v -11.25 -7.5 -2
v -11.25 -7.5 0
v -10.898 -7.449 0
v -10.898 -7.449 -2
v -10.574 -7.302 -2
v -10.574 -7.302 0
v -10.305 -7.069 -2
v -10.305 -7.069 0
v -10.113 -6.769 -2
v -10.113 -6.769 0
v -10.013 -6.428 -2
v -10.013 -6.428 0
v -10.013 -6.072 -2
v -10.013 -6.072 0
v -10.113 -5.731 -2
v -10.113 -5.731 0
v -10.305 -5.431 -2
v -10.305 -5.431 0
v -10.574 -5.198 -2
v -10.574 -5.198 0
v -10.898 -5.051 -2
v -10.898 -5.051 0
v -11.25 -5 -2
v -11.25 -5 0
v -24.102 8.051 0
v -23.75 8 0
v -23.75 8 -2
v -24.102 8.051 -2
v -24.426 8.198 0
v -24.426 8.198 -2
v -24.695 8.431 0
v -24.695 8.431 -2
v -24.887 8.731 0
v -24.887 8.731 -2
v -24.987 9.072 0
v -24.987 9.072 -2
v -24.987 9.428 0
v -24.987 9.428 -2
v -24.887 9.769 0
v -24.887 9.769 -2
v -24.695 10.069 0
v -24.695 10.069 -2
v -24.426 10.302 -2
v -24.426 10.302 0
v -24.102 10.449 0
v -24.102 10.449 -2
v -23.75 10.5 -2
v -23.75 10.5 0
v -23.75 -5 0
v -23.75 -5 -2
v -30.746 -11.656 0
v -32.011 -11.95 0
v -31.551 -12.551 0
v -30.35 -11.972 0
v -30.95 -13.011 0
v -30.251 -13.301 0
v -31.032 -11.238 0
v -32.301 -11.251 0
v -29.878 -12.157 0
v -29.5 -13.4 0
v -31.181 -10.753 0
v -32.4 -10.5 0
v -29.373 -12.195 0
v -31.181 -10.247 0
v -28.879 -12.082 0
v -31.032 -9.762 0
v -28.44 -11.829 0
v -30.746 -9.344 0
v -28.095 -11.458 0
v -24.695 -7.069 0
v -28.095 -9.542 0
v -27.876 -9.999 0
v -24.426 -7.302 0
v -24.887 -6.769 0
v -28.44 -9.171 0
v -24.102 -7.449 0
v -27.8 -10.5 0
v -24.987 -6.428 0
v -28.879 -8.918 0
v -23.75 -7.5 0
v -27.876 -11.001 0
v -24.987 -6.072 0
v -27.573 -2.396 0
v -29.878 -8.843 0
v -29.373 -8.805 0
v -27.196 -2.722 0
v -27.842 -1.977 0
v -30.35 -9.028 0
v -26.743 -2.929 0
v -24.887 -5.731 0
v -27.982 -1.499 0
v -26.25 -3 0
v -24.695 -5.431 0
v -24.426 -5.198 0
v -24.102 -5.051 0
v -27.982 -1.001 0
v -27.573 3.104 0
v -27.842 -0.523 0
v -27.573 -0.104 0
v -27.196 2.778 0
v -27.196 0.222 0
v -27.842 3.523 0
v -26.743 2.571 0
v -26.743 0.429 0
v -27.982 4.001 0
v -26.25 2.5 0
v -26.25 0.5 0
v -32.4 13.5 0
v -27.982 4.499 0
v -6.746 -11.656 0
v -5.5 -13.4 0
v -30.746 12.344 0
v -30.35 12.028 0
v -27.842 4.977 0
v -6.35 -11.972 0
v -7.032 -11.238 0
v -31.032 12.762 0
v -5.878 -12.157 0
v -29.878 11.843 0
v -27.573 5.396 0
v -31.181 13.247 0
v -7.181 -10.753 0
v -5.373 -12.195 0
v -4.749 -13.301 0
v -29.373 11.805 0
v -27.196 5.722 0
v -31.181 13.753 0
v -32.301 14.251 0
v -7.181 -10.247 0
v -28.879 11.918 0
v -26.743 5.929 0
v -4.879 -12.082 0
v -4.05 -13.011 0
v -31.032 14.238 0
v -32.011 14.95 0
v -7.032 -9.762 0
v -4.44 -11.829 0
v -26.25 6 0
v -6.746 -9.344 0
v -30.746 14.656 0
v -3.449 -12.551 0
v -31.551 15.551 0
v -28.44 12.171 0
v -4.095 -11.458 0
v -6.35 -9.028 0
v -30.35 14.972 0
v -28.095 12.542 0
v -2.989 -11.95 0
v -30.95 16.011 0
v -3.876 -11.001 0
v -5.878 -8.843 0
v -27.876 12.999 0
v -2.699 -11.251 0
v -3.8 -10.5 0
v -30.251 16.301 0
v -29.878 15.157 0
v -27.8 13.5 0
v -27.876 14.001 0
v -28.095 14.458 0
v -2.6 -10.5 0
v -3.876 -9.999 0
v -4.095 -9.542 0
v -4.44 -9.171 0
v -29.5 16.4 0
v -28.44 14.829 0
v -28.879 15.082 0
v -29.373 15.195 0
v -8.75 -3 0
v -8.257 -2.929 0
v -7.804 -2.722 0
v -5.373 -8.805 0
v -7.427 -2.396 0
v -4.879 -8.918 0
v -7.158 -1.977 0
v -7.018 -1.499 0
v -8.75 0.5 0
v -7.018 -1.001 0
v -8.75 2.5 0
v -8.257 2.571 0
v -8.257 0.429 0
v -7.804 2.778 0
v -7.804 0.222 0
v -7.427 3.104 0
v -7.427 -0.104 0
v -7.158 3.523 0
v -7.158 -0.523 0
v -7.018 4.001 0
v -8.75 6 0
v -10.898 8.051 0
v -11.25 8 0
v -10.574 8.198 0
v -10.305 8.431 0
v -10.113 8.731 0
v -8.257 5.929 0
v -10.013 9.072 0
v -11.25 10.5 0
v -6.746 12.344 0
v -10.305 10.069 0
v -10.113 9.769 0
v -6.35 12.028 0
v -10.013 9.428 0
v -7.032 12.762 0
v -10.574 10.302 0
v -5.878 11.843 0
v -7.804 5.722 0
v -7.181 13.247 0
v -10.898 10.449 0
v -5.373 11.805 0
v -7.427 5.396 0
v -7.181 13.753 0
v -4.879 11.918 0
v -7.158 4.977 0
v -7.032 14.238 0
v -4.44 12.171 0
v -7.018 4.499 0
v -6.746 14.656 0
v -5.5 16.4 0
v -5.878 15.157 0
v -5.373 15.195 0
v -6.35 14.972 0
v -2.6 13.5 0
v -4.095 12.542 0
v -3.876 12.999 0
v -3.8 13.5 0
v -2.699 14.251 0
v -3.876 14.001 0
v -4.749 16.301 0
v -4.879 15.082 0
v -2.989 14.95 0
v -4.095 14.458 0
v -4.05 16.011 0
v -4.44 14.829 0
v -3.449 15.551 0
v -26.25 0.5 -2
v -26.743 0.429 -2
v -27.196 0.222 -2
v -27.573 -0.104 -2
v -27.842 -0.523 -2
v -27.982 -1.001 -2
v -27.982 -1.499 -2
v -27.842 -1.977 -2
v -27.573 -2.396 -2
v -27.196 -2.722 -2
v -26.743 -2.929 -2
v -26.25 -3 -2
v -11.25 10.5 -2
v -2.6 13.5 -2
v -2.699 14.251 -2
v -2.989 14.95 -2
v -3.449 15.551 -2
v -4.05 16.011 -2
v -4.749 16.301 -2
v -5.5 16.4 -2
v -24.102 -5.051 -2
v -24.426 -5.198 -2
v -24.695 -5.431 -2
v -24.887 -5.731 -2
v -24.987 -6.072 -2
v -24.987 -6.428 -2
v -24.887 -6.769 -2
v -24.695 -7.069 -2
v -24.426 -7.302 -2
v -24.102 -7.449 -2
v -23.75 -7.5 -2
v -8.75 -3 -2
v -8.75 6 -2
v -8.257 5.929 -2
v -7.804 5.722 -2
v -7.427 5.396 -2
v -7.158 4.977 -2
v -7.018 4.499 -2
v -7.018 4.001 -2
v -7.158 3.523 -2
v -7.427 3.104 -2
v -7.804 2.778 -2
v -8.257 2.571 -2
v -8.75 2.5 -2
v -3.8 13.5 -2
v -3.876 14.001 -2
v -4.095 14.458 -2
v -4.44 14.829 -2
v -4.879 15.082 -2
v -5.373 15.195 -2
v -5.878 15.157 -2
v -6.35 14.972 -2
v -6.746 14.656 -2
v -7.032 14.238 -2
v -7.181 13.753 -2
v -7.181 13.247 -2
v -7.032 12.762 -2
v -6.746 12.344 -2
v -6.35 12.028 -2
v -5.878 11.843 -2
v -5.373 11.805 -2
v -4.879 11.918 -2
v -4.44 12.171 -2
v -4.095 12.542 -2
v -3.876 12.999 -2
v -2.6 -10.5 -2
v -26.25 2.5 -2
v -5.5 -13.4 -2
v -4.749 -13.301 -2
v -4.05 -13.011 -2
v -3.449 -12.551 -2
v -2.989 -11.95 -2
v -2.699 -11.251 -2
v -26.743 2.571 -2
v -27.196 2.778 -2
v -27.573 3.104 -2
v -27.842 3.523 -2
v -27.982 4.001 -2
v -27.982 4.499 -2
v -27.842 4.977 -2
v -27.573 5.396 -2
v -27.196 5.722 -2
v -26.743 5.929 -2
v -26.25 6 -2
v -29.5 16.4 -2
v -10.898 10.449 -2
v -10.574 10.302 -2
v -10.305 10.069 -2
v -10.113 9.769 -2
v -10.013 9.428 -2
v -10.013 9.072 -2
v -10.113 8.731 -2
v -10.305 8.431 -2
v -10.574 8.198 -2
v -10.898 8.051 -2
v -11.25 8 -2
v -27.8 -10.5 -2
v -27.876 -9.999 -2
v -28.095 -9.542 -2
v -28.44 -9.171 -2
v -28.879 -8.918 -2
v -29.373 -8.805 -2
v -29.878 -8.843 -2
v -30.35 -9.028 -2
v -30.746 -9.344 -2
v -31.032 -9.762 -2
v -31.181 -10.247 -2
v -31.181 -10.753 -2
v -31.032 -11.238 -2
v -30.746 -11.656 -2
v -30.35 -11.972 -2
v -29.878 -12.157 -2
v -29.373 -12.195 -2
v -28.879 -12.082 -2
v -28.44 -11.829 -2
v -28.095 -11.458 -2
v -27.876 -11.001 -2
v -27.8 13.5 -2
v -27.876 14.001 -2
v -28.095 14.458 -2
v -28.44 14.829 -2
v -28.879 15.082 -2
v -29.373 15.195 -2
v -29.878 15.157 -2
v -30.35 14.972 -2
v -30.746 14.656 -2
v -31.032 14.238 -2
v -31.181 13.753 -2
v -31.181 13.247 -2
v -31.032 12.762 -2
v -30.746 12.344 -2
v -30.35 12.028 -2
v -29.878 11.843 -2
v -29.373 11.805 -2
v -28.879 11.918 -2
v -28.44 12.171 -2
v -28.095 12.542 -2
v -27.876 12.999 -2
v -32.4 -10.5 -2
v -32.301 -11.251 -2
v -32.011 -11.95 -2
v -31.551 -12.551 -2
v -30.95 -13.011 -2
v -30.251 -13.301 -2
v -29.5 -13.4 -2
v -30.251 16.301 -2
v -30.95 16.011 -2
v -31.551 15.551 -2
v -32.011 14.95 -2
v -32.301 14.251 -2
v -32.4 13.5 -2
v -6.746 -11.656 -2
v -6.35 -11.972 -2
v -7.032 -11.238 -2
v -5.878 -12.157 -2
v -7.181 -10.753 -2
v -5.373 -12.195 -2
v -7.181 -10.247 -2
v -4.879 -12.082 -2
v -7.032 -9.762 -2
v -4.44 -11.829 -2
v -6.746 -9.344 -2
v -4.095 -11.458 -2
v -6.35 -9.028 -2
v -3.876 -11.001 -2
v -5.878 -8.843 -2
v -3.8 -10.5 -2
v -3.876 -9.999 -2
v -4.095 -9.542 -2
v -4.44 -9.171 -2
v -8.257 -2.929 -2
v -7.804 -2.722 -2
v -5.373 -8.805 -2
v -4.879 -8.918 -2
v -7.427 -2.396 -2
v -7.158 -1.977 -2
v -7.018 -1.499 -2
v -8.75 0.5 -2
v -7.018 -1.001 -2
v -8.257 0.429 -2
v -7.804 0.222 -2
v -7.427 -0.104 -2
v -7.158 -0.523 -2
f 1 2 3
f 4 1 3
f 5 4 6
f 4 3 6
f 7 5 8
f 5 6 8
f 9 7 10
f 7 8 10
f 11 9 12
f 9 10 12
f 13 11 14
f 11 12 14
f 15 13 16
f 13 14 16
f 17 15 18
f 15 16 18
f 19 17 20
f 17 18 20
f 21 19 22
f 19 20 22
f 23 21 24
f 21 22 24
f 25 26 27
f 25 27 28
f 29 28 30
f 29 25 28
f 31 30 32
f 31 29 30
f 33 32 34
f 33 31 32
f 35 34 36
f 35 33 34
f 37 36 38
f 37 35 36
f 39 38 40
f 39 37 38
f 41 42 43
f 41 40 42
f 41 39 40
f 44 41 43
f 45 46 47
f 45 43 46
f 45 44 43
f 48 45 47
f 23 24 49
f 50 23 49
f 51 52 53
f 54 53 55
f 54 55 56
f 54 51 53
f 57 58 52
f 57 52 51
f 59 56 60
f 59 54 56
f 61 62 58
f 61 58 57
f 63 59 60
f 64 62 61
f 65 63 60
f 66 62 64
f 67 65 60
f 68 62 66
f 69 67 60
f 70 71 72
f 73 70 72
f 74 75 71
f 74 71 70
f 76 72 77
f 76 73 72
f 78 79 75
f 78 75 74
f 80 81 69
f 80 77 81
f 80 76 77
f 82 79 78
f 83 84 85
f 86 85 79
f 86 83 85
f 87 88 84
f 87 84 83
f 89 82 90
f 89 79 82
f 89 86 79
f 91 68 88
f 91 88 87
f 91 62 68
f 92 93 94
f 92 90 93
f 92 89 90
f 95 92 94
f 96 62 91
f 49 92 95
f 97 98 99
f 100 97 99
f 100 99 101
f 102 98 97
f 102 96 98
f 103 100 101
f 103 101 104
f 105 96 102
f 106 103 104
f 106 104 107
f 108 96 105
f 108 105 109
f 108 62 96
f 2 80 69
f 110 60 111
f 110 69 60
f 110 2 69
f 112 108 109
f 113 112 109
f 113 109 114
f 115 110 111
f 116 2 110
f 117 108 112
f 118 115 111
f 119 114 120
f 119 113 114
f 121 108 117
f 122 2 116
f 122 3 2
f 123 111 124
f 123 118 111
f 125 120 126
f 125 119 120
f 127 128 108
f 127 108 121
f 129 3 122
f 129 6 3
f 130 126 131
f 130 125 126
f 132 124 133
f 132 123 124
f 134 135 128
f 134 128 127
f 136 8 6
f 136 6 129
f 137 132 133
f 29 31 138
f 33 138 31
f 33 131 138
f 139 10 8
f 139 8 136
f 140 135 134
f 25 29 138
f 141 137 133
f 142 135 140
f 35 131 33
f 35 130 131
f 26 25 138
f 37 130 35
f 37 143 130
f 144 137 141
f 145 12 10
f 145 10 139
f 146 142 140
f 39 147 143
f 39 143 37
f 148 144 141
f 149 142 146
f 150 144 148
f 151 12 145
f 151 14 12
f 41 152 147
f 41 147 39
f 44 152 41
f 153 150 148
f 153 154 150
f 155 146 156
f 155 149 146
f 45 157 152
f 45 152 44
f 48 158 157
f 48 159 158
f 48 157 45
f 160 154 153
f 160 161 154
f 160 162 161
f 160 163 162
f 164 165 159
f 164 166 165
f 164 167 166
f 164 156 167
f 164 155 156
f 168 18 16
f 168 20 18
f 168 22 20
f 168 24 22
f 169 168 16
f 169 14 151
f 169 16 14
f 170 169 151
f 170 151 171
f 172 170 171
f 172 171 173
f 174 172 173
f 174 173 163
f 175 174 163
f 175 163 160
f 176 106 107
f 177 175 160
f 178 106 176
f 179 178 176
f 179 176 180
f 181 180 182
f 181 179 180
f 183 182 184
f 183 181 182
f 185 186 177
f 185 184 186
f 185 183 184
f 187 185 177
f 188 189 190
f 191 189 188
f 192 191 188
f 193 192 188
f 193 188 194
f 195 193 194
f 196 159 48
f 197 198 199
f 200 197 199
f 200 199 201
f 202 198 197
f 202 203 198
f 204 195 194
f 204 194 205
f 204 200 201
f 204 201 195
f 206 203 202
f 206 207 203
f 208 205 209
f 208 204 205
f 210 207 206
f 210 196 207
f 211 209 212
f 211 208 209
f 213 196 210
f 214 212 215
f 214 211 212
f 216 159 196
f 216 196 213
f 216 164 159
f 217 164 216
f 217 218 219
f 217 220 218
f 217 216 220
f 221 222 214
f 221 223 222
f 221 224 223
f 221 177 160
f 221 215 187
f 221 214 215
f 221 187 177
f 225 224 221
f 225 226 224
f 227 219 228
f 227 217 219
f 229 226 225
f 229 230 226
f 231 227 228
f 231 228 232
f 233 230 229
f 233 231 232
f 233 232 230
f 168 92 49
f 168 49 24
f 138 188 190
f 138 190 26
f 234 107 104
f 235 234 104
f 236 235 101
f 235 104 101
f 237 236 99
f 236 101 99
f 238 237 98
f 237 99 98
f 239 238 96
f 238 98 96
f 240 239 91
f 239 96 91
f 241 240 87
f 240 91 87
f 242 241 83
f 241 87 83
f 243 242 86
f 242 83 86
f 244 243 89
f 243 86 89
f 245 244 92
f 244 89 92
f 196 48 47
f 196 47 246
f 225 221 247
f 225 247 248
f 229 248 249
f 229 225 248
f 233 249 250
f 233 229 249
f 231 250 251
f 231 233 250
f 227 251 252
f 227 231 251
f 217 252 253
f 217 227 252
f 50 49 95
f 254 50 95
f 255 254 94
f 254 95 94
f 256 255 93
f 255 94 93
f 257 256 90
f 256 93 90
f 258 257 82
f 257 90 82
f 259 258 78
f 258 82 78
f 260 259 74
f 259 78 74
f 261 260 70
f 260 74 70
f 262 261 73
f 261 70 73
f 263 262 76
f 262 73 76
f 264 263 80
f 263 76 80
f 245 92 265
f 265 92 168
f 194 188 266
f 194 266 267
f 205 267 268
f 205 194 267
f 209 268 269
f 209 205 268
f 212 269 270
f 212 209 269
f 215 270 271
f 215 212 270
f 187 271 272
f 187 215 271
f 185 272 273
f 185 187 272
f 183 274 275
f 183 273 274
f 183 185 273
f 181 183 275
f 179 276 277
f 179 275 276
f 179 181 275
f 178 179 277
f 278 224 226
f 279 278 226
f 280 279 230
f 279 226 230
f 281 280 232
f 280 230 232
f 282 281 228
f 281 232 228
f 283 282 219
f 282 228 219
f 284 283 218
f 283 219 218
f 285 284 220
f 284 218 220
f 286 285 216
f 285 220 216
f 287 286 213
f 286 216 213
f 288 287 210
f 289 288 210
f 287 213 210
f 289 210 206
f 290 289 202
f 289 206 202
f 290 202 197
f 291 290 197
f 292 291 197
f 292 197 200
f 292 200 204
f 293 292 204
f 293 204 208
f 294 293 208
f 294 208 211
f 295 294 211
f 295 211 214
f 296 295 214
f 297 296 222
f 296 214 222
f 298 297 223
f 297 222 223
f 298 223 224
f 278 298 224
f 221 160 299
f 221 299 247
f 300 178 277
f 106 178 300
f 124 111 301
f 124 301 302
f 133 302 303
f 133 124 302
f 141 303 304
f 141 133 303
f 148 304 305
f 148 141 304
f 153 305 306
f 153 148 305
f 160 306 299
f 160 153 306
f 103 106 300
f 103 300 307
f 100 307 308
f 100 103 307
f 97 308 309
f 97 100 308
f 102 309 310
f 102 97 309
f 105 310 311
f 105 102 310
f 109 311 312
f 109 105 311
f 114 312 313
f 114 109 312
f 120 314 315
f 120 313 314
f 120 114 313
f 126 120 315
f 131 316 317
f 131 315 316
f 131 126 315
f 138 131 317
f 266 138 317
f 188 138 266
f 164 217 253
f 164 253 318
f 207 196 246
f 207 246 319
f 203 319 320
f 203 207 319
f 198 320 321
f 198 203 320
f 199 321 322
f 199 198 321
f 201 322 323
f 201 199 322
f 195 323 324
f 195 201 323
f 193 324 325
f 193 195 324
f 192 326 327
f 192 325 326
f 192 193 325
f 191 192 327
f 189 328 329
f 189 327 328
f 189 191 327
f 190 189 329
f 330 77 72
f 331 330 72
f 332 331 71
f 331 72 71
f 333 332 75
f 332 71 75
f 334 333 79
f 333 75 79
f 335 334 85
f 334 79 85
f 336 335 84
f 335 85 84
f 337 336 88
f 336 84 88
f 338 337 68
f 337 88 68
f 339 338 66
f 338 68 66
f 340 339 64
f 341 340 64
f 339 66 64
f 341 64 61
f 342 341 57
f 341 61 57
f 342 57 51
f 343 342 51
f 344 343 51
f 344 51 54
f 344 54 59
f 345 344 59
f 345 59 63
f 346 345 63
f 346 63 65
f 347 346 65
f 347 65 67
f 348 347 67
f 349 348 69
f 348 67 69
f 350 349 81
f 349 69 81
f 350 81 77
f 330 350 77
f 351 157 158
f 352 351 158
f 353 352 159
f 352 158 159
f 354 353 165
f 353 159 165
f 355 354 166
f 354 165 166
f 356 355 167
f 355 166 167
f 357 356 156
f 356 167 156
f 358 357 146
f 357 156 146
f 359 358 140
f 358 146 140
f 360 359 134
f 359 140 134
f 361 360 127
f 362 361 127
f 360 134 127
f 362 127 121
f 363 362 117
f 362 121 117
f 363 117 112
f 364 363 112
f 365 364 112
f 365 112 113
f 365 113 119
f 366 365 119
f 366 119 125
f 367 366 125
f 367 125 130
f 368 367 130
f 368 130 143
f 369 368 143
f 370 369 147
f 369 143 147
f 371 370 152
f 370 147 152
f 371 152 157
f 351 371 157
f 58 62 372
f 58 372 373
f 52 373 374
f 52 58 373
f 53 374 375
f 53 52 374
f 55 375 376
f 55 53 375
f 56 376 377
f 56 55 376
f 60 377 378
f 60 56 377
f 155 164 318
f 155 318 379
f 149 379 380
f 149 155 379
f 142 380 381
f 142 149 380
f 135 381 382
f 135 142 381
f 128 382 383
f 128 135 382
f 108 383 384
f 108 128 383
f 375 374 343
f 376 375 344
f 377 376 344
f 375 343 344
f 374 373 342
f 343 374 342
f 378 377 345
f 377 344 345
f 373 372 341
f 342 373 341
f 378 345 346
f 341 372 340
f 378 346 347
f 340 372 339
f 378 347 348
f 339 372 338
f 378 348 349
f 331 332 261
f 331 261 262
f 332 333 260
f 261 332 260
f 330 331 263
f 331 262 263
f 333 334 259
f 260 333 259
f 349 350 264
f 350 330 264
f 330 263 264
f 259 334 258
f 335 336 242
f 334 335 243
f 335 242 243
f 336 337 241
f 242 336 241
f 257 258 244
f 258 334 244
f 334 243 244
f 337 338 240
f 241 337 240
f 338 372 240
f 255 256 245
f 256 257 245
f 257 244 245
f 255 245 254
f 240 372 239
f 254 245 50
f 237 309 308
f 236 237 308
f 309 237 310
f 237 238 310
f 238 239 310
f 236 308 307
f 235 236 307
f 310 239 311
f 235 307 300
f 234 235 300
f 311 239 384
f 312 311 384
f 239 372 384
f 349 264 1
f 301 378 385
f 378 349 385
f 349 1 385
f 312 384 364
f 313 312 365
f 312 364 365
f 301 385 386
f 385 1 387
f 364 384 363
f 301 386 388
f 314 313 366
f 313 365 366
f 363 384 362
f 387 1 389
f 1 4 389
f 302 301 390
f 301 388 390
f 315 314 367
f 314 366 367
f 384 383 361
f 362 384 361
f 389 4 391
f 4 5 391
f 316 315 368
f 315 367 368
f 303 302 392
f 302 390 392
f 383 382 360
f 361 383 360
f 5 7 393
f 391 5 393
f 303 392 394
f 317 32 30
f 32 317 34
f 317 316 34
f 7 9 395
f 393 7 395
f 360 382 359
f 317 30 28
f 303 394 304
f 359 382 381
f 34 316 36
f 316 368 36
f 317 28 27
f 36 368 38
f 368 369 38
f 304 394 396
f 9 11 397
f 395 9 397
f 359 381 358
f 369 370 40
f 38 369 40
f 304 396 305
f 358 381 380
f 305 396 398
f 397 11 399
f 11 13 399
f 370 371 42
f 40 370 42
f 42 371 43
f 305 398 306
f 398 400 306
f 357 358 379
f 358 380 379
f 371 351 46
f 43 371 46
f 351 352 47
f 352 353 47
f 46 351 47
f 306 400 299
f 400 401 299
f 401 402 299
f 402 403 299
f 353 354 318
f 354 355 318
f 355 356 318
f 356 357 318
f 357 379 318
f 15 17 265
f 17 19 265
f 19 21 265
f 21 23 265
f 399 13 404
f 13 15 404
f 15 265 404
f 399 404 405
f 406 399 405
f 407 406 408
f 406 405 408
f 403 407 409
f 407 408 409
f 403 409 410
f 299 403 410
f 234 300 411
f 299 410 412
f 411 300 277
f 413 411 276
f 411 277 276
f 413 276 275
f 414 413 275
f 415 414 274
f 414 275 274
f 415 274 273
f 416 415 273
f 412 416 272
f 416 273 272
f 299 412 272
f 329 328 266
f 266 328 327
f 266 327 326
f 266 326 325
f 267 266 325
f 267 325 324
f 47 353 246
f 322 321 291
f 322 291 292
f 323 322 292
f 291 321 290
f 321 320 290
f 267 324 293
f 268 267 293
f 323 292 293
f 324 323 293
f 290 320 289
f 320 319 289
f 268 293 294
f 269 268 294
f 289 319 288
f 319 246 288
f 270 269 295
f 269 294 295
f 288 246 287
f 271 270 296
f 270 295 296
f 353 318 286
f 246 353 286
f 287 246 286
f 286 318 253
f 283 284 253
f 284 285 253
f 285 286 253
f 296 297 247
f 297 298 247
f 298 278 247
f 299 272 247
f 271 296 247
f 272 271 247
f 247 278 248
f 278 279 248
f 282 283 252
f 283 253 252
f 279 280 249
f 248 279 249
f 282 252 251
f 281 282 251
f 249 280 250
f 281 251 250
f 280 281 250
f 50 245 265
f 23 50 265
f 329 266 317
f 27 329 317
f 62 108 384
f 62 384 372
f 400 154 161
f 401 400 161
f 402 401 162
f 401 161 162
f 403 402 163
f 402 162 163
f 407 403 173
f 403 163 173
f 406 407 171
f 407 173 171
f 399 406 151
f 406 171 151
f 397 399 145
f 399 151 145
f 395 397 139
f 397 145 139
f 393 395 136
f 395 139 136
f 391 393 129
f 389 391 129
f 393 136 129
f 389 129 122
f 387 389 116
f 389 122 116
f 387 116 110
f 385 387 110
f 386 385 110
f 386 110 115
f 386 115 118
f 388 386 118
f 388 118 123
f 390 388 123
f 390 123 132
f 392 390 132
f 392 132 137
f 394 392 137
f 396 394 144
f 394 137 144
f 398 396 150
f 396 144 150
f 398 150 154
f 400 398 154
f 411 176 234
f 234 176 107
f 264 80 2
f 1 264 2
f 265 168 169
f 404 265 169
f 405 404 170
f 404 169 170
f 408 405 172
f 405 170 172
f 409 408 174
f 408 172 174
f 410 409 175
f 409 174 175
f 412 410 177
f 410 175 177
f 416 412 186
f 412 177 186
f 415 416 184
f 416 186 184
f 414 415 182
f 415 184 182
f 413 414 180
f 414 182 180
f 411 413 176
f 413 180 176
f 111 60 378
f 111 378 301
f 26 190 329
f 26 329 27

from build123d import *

# Parameters (mm, degrees)
SKETCH1_R               = 1.7
BOSS_EXTRUDE1_DEPTH     = 2
CUT_EXTRUDE1_DEPTH      = 1
CUT_EXTRUDE1_DEPTH_BACK = 3


with BuildPart() as part:
    # Sketch1 → Boss-Extrude1 (new body)
    with BuildSketch(Plane.XY):
        with BuildLine():
            ThreePointArc((-29.5, 16.4), (-31.550609665, 15.550609665), (-32.4, 13.5))
            Line((-32.4, 13.5), (-32.4, -10.5))
            ThreePointArc((-32.4, -10.5), (-31.550609665, -12.550609665), (-29.5, -13.4))
            Line((-29.5, -13.4), (-5.5, -13.4))
            ThreePointArc((-5.5, -13.4), (-3.449390335, -12.550609665), (-2.6, -10.5))
            Line((-2.6, -10.5), (-2.6, 13.5))
            ThreePointArc((-2.6, 13.5), (-3.449390335, 15.550609665), (-5.5, 16.4))
            Line((-5.5, 16.4), (-29.5, 16.4))
        make_face()
        with Locations((-29.5, -10.5)):
            Circle(SKETCH1_R, mode=Mode.SUBTRACT)
        with Locations((-5.5, -10.5)):
            Circle(SKETCH1_R, mode=Mode.SUBTRACT)
        with Locations((-29.5, 13.5)):
            Circle(SKETCH1_R, mode=Mode.SUBTRACT)
        with Locations((-5.5, 13.5)):
            Circle(SKETCH1_R, mode=Mode.SUBTRACT)
    extrude(amount=-BOSS_EXTRUDE1_DEPTH)

    # Sketch3 → Cut-Extrude1 (cut, two sides)
    with BuildSketch(Plane.XY) as cut_extrude1_sk:
        with BuildLine():
            Line((-23.75, 10.5), (-11.25, 10.5))
            ThreePointArc((-11.25, 10.5), (-10, 9.25), (-11.25, 8))
            Line((-11.25, 8), (-23.75, 8))
            ThreePointArc((-23.75, 8), (-25, 9.25), (-23.75, 10.5))
        make_face()
        with BuildLine():
            Line((-26.25, 6), (-8.75, 6))
            ThreePointArc((-8.75, 6), (-7, 4.25), (-8.75, 2.5))
            Line((-8.75, 2.5), (-26.25, 2.5))
            ThreePointArc((-26.25, 2.5), (-28, 4.25), (-26.25, 6))
        make_face()
        with BuildLine():
            Line((-26.25, -3), (-8.75, -3))
            ThreePointArc((-8.75, -3), (-7, -1.25), (-8.75, 0.5))
            Line((-8.75, 0.5), (-26.25, 0.5))
            ThreePointArc((-26.25, 0.5), (-28, -1.25), (-26.25, -3))
        make_face()
        with BuildLine():
            Line((-23.75, -7.5), (-11.25, -7.5))
            ThreePointArc((-11.25, -7.5), (-10, -6.25), (-11.25, -5))
            Line((-11.25, -5), (-23.75, -5))
            ThreePointArc((-23.75, -5), (-25, -6.25), (-23.75, -7.5))
        make_face()
    extrude(amount=CUT_EXTRUDE1_DEPTH, mode=Mode.SUBTRACT)
    extrude(cut_extrude1_sk.sketch, amount=-CUT_EXTRUDE1_DEPTH_BACK, mode=Mode.SUBTRACT)


solid = part.part
